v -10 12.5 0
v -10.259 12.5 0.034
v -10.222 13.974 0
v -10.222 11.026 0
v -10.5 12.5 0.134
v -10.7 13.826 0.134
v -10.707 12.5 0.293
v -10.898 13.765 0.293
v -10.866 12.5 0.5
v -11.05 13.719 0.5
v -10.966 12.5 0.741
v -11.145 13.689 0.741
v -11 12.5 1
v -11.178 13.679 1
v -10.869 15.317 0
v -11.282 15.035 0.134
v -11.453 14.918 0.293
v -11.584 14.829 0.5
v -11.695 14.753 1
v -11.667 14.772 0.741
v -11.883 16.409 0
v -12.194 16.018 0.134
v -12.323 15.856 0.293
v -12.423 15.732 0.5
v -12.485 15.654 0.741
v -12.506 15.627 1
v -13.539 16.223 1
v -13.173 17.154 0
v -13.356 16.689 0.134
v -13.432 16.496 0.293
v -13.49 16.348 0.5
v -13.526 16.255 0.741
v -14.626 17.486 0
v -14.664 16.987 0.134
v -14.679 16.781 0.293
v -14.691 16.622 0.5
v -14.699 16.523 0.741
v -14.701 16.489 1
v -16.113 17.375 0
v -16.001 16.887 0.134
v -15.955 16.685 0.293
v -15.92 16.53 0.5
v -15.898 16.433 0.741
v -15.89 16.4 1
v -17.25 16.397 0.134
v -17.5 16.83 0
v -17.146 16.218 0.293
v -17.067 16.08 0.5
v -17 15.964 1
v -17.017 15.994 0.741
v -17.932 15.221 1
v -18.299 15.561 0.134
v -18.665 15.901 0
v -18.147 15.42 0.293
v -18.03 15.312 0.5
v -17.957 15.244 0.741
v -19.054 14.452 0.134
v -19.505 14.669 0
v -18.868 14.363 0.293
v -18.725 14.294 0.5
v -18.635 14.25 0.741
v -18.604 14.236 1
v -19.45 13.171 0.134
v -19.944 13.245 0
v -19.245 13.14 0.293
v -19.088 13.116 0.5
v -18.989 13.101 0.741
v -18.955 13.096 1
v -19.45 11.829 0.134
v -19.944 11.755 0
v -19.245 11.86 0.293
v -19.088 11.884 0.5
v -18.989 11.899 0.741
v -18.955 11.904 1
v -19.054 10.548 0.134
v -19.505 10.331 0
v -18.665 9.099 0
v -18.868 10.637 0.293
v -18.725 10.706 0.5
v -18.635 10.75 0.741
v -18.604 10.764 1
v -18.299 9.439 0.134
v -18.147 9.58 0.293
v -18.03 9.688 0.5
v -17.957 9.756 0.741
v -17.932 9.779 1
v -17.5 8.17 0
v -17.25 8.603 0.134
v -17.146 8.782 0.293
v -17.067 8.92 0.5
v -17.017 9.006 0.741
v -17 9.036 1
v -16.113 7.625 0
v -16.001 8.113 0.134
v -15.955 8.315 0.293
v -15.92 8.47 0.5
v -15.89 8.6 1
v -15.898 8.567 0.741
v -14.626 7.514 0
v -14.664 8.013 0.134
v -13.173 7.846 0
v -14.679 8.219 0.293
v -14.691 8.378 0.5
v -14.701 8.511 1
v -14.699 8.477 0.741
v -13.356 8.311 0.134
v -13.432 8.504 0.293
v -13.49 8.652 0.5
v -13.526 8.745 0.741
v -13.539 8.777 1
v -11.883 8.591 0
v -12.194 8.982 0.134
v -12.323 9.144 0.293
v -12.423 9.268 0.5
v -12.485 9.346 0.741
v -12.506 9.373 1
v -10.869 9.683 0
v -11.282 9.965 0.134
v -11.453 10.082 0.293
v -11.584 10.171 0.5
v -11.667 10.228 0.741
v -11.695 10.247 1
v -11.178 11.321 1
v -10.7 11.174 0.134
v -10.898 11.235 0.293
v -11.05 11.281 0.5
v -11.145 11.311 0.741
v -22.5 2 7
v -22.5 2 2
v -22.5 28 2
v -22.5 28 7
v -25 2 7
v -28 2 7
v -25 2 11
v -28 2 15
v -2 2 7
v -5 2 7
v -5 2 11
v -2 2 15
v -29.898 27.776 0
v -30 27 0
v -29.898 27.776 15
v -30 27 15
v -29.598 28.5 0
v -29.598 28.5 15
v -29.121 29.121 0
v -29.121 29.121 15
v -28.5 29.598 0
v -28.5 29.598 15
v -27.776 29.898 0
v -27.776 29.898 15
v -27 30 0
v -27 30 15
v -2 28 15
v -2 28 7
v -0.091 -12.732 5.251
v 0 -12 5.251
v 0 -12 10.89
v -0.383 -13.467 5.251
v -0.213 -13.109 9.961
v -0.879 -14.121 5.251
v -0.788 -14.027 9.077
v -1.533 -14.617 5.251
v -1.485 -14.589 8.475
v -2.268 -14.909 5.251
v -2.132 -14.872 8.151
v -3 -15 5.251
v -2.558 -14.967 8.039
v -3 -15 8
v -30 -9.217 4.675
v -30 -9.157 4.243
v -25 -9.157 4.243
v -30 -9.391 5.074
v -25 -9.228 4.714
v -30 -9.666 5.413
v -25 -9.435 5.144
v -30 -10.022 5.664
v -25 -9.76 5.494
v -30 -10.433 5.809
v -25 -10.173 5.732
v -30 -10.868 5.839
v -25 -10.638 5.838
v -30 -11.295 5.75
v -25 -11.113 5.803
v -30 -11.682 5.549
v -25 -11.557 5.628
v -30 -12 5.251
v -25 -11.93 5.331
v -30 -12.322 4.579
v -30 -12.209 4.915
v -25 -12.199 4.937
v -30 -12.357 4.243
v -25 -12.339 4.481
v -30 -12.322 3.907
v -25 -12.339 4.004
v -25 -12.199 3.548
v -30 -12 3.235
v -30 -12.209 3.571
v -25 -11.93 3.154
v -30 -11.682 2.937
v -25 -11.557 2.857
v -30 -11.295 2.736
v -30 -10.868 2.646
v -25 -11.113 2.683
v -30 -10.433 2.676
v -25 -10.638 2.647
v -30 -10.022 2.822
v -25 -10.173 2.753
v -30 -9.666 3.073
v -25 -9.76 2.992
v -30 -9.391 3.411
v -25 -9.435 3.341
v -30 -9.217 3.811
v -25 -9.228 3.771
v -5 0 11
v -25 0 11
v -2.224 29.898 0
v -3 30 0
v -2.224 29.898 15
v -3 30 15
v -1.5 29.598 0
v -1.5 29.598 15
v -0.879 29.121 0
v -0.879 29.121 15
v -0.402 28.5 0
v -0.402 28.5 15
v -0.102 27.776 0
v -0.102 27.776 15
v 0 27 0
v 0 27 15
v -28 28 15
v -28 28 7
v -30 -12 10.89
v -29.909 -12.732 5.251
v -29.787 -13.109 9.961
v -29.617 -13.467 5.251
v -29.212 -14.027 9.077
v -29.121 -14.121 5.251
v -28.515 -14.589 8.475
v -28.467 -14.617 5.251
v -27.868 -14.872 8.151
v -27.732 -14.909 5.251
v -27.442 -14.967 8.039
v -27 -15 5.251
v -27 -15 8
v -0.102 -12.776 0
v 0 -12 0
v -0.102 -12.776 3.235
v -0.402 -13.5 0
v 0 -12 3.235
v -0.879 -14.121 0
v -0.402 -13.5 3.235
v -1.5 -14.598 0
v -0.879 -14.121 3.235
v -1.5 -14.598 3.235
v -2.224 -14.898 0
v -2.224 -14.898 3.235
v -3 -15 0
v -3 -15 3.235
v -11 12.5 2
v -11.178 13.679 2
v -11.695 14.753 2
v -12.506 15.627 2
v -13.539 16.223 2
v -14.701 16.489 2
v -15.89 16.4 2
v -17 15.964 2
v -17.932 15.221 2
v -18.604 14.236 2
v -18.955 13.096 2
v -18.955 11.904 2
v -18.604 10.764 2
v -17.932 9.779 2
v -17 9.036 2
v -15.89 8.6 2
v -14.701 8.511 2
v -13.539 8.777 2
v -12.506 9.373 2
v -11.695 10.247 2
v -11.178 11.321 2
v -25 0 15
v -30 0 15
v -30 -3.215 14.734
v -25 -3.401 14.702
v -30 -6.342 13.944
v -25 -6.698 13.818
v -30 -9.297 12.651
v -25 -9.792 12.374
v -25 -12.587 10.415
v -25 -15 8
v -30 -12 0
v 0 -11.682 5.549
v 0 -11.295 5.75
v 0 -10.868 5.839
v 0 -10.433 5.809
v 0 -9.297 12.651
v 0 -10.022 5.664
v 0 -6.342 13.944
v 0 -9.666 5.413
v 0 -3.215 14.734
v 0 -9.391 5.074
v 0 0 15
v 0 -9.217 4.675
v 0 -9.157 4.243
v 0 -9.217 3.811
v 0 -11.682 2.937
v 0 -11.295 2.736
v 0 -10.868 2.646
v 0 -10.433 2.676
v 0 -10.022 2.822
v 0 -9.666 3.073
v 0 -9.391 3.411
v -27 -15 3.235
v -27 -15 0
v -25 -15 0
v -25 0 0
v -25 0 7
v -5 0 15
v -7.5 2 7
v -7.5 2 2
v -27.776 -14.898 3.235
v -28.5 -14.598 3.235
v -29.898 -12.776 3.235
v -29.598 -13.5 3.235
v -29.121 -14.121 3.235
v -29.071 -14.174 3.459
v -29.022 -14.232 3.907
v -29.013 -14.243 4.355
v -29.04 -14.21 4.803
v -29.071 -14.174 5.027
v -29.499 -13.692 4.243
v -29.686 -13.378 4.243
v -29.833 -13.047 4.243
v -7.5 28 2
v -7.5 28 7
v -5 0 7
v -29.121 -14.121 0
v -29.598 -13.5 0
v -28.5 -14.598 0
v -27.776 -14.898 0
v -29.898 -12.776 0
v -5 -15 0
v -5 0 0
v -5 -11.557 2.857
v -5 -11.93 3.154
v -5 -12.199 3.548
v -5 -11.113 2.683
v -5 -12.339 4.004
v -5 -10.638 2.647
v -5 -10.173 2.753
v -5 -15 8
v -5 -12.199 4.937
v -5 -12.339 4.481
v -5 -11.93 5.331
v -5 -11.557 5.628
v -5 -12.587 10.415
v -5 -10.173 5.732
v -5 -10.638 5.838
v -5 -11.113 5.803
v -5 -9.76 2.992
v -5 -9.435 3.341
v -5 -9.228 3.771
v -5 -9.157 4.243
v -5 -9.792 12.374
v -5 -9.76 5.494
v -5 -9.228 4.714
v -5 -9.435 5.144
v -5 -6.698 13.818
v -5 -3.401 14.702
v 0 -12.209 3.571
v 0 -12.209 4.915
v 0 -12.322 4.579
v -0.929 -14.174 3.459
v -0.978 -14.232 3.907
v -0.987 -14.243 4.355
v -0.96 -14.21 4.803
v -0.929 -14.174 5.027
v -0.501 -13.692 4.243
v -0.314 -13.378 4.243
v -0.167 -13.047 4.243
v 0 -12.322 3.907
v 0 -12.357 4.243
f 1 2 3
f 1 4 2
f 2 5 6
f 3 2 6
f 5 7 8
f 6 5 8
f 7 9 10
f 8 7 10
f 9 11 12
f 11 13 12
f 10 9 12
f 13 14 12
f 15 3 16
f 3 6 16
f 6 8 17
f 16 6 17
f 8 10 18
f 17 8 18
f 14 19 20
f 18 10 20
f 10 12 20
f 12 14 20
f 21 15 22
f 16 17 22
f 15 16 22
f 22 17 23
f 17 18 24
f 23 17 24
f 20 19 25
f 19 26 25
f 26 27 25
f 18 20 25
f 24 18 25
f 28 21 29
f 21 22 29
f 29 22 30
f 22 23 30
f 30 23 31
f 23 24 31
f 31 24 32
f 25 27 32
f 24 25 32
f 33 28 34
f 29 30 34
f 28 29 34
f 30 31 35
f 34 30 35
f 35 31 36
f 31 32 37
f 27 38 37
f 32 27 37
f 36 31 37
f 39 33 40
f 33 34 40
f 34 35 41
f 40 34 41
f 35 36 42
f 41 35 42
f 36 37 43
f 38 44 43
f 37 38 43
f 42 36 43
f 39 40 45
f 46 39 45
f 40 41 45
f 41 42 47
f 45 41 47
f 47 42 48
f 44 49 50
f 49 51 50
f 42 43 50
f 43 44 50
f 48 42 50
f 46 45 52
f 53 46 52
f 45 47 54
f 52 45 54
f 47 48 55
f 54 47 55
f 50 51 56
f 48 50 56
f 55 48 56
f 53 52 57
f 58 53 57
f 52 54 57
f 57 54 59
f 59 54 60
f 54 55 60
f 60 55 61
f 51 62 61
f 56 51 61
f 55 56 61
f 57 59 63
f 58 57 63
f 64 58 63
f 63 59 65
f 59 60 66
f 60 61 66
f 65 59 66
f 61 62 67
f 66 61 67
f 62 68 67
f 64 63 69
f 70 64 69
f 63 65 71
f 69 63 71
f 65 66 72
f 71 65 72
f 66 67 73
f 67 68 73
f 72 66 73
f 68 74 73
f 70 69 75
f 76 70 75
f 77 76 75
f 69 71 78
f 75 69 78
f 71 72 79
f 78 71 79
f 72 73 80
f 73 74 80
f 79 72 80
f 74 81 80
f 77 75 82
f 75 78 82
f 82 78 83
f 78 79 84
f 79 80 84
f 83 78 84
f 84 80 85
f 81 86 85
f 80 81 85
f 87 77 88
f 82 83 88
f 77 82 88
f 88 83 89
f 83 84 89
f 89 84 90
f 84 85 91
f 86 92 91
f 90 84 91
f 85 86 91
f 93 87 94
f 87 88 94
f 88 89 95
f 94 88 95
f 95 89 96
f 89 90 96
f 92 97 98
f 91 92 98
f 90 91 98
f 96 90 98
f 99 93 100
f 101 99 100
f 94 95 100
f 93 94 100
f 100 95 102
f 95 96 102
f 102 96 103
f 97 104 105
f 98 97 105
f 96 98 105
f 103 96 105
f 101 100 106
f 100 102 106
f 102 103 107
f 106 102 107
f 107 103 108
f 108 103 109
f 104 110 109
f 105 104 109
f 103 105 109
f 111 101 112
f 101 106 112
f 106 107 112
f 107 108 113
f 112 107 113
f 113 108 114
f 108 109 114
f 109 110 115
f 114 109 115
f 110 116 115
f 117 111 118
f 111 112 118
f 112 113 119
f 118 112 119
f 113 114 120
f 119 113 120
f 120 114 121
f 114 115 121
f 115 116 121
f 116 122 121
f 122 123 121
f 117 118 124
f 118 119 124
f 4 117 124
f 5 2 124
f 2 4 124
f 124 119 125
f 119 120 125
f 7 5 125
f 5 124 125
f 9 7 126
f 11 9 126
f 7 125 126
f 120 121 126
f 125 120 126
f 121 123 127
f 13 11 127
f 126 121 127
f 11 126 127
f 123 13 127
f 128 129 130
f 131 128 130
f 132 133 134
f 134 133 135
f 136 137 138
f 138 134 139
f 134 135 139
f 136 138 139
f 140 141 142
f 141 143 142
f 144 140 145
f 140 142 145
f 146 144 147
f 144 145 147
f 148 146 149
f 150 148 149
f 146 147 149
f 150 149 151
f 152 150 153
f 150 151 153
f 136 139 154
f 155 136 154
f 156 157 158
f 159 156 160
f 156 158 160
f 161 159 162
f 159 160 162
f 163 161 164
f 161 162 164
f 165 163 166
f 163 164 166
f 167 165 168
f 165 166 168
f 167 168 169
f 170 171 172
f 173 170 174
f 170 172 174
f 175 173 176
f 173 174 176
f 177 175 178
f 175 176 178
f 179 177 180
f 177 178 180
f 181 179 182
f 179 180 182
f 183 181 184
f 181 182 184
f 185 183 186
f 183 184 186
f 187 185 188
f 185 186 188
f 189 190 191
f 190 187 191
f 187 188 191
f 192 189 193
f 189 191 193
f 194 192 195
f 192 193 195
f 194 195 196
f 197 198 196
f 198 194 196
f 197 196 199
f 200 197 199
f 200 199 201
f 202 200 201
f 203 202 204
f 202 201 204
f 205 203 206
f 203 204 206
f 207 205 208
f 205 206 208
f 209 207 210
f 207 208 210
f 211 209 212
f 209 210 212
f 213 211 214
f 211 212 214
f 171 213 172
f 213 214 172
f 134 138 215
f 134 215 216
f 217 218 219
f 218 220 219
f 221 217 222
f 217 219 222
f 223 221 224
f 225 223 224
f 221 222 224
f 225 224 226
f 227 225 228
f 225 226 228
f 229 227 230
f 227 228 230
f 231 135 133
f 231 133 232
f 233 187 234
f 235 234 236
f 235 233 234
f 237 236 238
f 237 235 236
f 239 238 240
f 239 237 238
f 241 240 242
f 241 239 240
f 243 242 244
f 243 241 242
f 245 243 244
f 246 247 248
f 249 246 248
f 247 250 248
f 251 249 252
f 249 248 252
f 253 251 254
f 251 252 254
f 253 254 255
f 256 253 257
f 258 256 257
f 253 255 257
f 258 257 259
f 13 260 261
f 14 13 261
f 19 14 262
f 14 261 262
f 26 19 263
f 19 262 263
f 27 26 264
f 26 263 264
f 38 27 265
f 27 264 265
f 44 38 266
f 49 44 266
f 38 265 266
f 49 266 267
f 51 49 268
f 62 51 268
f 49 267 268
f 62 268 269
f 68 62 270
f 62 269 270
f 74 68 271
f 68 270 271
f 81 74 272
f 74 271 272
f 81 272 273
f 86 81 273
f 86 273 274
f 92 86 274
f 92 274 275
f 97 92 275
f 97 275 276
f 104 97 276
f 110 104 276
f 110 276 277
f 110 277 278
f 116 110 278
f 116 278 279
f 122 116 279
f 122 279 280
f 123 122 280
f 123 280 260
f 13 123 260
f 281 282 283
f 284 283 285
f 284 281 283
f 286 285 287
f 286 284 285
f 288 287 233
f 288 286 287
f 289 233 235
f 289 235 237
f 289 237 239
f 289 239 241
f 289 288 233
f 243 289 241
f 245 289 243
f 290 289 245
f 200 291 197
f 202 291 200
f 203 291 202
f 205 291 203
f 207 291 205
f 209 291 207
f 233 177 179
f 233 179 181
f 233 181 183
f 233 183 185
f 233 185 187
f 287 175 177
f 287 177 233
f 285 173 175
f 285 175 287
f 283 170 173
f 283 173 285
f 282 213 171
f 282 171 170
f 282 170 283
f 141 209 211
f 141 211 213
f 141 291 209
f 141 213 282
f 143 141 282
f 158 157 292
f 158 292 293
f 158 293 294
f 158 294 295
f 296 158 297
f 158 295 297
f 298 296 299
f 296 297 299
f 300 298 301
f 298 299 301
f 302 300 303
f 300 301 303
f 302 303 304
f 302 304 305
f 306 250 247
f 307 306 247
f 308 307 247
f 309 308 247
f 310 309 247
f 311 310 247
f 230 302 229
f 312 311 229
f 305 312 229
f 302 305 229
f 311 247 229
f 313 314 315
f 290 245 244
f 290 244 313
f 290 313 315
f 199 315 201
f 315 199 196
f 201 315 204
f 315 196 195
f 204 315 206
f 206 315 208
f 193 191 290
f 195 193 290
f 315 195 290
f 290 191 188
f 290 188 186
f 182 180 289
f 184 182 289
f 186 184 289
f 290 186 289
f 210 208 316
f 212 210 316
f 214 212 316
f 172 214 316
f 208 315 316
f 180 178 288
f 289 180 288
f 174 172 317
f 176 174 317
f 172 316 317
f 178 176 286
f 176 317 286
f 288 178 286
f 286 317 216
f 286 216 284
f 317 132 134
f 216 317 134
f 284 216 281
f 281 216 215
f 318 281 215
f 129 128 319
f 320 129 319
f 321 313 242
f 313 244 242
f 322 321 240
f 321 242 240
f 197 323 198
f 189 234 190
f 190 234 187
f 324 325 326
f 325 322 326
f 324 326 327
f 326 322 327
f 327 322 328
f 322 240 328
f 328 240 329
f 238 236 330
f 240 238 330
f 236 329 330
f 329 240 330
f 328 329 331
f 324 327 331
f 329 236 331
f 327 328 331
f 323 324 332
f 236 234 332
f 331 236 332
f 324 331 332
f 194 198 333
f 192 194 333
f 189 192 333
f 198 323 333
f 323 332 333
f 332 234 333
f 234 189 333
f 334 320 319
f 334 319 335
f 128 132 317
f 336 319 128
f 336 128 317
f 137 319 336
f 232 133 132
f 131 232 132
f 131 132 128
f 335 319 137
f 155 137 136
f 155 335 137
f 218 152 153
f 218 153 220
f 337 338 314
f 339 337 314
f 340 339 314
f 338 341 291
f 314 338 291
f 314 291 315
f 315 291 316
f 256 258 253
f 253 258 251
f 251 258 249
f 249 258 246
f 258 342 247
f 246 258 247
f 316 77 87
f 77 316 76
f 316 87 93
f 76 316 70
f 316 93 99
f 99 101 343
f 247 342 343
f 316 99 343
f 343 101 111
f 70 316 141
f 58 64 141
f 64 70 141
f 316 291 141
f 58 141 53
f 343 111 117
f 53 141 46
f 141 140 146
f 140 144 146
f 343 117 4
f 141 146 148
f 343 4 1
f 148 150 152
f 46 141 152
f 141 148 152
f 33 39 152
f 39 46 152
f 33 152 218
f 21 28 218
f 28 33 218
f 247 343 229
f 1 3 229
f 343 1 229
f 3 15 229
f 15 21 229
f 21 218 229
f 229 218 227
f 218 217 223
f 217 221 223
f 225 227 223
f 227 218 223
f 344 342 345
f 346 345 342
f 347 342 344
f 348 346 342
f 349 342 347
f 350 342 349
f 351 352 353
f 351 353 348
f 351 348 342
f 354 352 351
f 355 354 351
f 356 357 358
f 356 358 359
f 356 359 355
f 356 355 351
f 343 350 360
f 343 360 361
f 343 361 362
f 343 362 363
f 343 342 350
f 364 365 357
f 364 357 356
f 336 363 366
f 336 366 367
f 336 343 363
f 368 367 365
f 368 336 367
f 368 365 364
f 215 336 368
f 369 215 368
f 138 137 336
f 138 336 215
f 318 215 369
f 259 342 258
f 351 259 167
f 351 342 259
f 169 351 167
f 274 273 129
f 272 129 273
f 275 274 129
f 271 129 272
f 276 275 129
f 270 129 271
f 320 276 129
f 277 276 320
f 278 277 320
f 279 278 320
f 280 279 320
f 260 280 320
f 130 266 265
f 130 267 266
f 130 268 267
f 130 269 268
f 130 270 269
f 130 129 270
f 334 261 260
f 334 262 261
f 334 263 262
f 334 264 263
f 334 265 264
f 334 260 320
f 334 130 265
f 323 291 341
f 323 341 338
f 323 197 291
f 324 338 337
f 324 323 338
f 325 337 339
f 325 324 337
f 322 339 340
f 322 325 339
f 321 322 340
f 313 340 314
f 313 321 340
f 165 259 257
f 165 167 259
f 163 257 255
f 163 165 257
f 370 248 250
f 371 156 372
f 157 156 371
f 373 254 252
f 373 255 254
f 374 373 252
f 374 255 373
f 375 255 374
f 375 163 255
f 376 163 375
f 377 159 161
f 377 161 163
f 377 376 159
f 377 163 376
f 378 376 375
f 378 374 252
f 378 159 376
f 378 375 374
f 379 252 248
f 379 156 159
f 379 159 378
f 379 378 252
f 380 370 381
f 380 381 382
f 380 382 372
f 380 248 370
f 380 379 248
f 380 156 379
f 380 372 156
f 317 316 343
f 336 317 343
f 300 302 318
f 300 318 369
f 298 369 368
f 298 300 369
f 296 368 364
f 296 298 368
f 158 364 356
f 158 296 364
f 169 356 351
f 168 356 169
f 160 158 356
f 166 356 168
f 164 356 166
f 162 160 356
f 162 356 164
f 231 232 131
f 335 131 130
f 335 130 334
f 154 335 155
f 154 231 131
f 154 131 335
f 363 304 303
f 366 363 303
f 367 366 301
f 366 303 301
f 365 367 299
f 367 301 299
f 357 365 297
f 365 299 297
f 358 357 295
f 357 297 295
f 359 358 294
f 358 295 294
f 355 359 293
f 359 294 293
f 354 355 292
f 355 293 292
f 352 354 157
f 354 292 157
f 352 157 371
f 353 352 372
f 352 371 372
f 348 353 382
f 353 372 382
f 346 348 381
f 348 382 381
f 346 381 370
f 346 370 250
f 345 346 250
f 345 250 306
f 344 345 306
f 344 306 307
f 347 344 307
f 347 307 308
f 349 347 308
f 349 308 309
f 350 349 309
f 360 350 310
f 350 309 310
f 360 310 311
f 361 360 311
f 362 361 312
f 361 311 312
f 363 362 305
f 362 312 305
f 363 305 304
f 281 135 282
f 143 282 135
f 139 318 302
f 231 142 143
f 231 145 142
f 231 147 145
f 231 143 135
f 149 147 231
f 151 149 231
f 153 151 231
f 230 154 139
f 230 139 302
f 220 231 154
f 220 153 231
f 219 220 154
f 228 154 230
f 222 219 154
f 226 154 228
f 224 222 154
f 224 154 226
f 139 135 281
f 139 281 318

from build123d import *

# Parameters (mm, degrees)
SKETCH_W        = 30
SKETCH_H        = 30
PAD_DEPTH       = 15
SKETCH001_W     = 26
SKETCH001_H     = 26
POCKET_DEPTH    = 13
SKETCH002_W     = 5.5
SKETCH002_H     = 26
PAD001_DEPTH    = 5
SKETCH003_W     = 20
SKETCH003_H     = 4
POCKET001_DEPTH = 5
SKETCH004_R     = 4
POCKET002_DEPTH = 5
SKETCH005_W     = 5
SKETCH005_H     = 15
PAD002_DEPTH    = 15
SKETCH006_R     = 1.6
POCKET003_DEPTH = 30.001
FILLET_R        = 3
FILLET001_R     = 3
FILLET002_R     = 1


with BuildPart() as part:
    # Sketch → Pad (new body)
    with BuildSketch(Plane.XY):
        with Locations((-15, 15)):
            Rectangle(SKETCH_W, SKETCH_H)
    extrude(amount=PAD_DEPTH)

    # Sketch001 (on Face6 of Pad) → Pocket (cut)
    with BuildSketch(Plane.XY.offset(15)):
        with Locations((-15, 15)):
            Rectangle(SKETCH001_W, SKETCH001_H)
    extrude(amount=-POCKET_DEPTH, mode=Mode.SUBTRACT)

    # Sketch002 (on Face11 of Pocket) → Pad001 (join)
    with BuildSketch(Plane.XY.offset(2)):
        with Locations((-25.25, 15)):
            Rectangle(SKETCH002_W, SKETCH002_H)
        with Locations((-4.75, 15)):
            Rectangle(SKETCH002_W, SKETCH002_H)
    extrude(amount=PAD001_DEPTH)

    # Sketch003 (on Face9 of Pad001) → Pocket001 (cut)
    with BuildSketch(Plane(origin=(0, 2, 0), x_dir=(-1, 0, 0), z_dir=(0, 1, 0))):
        with Locations((15, 9)):
            Rectangle(SKETCH003_W, SKETCH003_H)
    extrude(amount=-POCKET001_DEPTH, mode=Mode.SUBTRACT)

    # Sketch004 (on Face19 of Pocket001) → Pocket002 (cut)
    with BuildSketch(Plane.XY.offset(2)):
        with Locations((-15, 12.5)):
            Circle(SKETCH004_R)
    extrude(amount=-POCKET002_DEPTH, mode=Mode.SUBTRACT)

    # Sketch005 (on Face1 of Pocket002) → Pad002 (join)
    with BuildSketch(Plane.XZ):
        with Locations((-27.5, 7.5)):
            Rectangle(SKETCH005_W, SKETCH005_H)
        with Locations((-2.5, 7.5)):
            Rectangle(SKETCH005_W, SKETCH005_H)
    extrude(amount=PAD002_DEPTH)

    # Sketch006 (on Face22 of Pad002) → Pocket003 (cut, through all)
    with BuildSketch(Plane.YZ):
        with Locations((-10.757359, 4.242641)):
            Circle(SKETCH006_R)
        with BuildLine():
            ThreePointArc((0, 15), (-8.276473, 13.16387), (-15, 8))
            Line((-15, 8), (-15, 15))
            Line((-15, 15), (0, 15))
        make_face()
    extrude(amount=-POCKET003_DEPTH, mode=Mode.SUBTRACT)

    # Fillet
    fillet_edges = [part.edges().sort_by_distance(p)[0] for p in [
        (-30, 30, 7.5),
        (0, 30, 7.5),
    ]]
    fillet(fillet_edges, radius=FILLET_R)

    # Fillet001
    fillet001_edges = [part.edges().sort_by_distance(p)[0] for p in [
        (-30, -15, 4),
        (0, -15, 4),
    ]]
    fillet(fillet001_edges, radius=FILLET001_R)

    # Fillet002
    fillet002_edges = [part.edges().sort_by_distance(p)[0] for p in [
        (-19, 12.5, 0),
    ]]
    fillet(fillet002_edges, radius=FILLET002_R)


solid = part.part
